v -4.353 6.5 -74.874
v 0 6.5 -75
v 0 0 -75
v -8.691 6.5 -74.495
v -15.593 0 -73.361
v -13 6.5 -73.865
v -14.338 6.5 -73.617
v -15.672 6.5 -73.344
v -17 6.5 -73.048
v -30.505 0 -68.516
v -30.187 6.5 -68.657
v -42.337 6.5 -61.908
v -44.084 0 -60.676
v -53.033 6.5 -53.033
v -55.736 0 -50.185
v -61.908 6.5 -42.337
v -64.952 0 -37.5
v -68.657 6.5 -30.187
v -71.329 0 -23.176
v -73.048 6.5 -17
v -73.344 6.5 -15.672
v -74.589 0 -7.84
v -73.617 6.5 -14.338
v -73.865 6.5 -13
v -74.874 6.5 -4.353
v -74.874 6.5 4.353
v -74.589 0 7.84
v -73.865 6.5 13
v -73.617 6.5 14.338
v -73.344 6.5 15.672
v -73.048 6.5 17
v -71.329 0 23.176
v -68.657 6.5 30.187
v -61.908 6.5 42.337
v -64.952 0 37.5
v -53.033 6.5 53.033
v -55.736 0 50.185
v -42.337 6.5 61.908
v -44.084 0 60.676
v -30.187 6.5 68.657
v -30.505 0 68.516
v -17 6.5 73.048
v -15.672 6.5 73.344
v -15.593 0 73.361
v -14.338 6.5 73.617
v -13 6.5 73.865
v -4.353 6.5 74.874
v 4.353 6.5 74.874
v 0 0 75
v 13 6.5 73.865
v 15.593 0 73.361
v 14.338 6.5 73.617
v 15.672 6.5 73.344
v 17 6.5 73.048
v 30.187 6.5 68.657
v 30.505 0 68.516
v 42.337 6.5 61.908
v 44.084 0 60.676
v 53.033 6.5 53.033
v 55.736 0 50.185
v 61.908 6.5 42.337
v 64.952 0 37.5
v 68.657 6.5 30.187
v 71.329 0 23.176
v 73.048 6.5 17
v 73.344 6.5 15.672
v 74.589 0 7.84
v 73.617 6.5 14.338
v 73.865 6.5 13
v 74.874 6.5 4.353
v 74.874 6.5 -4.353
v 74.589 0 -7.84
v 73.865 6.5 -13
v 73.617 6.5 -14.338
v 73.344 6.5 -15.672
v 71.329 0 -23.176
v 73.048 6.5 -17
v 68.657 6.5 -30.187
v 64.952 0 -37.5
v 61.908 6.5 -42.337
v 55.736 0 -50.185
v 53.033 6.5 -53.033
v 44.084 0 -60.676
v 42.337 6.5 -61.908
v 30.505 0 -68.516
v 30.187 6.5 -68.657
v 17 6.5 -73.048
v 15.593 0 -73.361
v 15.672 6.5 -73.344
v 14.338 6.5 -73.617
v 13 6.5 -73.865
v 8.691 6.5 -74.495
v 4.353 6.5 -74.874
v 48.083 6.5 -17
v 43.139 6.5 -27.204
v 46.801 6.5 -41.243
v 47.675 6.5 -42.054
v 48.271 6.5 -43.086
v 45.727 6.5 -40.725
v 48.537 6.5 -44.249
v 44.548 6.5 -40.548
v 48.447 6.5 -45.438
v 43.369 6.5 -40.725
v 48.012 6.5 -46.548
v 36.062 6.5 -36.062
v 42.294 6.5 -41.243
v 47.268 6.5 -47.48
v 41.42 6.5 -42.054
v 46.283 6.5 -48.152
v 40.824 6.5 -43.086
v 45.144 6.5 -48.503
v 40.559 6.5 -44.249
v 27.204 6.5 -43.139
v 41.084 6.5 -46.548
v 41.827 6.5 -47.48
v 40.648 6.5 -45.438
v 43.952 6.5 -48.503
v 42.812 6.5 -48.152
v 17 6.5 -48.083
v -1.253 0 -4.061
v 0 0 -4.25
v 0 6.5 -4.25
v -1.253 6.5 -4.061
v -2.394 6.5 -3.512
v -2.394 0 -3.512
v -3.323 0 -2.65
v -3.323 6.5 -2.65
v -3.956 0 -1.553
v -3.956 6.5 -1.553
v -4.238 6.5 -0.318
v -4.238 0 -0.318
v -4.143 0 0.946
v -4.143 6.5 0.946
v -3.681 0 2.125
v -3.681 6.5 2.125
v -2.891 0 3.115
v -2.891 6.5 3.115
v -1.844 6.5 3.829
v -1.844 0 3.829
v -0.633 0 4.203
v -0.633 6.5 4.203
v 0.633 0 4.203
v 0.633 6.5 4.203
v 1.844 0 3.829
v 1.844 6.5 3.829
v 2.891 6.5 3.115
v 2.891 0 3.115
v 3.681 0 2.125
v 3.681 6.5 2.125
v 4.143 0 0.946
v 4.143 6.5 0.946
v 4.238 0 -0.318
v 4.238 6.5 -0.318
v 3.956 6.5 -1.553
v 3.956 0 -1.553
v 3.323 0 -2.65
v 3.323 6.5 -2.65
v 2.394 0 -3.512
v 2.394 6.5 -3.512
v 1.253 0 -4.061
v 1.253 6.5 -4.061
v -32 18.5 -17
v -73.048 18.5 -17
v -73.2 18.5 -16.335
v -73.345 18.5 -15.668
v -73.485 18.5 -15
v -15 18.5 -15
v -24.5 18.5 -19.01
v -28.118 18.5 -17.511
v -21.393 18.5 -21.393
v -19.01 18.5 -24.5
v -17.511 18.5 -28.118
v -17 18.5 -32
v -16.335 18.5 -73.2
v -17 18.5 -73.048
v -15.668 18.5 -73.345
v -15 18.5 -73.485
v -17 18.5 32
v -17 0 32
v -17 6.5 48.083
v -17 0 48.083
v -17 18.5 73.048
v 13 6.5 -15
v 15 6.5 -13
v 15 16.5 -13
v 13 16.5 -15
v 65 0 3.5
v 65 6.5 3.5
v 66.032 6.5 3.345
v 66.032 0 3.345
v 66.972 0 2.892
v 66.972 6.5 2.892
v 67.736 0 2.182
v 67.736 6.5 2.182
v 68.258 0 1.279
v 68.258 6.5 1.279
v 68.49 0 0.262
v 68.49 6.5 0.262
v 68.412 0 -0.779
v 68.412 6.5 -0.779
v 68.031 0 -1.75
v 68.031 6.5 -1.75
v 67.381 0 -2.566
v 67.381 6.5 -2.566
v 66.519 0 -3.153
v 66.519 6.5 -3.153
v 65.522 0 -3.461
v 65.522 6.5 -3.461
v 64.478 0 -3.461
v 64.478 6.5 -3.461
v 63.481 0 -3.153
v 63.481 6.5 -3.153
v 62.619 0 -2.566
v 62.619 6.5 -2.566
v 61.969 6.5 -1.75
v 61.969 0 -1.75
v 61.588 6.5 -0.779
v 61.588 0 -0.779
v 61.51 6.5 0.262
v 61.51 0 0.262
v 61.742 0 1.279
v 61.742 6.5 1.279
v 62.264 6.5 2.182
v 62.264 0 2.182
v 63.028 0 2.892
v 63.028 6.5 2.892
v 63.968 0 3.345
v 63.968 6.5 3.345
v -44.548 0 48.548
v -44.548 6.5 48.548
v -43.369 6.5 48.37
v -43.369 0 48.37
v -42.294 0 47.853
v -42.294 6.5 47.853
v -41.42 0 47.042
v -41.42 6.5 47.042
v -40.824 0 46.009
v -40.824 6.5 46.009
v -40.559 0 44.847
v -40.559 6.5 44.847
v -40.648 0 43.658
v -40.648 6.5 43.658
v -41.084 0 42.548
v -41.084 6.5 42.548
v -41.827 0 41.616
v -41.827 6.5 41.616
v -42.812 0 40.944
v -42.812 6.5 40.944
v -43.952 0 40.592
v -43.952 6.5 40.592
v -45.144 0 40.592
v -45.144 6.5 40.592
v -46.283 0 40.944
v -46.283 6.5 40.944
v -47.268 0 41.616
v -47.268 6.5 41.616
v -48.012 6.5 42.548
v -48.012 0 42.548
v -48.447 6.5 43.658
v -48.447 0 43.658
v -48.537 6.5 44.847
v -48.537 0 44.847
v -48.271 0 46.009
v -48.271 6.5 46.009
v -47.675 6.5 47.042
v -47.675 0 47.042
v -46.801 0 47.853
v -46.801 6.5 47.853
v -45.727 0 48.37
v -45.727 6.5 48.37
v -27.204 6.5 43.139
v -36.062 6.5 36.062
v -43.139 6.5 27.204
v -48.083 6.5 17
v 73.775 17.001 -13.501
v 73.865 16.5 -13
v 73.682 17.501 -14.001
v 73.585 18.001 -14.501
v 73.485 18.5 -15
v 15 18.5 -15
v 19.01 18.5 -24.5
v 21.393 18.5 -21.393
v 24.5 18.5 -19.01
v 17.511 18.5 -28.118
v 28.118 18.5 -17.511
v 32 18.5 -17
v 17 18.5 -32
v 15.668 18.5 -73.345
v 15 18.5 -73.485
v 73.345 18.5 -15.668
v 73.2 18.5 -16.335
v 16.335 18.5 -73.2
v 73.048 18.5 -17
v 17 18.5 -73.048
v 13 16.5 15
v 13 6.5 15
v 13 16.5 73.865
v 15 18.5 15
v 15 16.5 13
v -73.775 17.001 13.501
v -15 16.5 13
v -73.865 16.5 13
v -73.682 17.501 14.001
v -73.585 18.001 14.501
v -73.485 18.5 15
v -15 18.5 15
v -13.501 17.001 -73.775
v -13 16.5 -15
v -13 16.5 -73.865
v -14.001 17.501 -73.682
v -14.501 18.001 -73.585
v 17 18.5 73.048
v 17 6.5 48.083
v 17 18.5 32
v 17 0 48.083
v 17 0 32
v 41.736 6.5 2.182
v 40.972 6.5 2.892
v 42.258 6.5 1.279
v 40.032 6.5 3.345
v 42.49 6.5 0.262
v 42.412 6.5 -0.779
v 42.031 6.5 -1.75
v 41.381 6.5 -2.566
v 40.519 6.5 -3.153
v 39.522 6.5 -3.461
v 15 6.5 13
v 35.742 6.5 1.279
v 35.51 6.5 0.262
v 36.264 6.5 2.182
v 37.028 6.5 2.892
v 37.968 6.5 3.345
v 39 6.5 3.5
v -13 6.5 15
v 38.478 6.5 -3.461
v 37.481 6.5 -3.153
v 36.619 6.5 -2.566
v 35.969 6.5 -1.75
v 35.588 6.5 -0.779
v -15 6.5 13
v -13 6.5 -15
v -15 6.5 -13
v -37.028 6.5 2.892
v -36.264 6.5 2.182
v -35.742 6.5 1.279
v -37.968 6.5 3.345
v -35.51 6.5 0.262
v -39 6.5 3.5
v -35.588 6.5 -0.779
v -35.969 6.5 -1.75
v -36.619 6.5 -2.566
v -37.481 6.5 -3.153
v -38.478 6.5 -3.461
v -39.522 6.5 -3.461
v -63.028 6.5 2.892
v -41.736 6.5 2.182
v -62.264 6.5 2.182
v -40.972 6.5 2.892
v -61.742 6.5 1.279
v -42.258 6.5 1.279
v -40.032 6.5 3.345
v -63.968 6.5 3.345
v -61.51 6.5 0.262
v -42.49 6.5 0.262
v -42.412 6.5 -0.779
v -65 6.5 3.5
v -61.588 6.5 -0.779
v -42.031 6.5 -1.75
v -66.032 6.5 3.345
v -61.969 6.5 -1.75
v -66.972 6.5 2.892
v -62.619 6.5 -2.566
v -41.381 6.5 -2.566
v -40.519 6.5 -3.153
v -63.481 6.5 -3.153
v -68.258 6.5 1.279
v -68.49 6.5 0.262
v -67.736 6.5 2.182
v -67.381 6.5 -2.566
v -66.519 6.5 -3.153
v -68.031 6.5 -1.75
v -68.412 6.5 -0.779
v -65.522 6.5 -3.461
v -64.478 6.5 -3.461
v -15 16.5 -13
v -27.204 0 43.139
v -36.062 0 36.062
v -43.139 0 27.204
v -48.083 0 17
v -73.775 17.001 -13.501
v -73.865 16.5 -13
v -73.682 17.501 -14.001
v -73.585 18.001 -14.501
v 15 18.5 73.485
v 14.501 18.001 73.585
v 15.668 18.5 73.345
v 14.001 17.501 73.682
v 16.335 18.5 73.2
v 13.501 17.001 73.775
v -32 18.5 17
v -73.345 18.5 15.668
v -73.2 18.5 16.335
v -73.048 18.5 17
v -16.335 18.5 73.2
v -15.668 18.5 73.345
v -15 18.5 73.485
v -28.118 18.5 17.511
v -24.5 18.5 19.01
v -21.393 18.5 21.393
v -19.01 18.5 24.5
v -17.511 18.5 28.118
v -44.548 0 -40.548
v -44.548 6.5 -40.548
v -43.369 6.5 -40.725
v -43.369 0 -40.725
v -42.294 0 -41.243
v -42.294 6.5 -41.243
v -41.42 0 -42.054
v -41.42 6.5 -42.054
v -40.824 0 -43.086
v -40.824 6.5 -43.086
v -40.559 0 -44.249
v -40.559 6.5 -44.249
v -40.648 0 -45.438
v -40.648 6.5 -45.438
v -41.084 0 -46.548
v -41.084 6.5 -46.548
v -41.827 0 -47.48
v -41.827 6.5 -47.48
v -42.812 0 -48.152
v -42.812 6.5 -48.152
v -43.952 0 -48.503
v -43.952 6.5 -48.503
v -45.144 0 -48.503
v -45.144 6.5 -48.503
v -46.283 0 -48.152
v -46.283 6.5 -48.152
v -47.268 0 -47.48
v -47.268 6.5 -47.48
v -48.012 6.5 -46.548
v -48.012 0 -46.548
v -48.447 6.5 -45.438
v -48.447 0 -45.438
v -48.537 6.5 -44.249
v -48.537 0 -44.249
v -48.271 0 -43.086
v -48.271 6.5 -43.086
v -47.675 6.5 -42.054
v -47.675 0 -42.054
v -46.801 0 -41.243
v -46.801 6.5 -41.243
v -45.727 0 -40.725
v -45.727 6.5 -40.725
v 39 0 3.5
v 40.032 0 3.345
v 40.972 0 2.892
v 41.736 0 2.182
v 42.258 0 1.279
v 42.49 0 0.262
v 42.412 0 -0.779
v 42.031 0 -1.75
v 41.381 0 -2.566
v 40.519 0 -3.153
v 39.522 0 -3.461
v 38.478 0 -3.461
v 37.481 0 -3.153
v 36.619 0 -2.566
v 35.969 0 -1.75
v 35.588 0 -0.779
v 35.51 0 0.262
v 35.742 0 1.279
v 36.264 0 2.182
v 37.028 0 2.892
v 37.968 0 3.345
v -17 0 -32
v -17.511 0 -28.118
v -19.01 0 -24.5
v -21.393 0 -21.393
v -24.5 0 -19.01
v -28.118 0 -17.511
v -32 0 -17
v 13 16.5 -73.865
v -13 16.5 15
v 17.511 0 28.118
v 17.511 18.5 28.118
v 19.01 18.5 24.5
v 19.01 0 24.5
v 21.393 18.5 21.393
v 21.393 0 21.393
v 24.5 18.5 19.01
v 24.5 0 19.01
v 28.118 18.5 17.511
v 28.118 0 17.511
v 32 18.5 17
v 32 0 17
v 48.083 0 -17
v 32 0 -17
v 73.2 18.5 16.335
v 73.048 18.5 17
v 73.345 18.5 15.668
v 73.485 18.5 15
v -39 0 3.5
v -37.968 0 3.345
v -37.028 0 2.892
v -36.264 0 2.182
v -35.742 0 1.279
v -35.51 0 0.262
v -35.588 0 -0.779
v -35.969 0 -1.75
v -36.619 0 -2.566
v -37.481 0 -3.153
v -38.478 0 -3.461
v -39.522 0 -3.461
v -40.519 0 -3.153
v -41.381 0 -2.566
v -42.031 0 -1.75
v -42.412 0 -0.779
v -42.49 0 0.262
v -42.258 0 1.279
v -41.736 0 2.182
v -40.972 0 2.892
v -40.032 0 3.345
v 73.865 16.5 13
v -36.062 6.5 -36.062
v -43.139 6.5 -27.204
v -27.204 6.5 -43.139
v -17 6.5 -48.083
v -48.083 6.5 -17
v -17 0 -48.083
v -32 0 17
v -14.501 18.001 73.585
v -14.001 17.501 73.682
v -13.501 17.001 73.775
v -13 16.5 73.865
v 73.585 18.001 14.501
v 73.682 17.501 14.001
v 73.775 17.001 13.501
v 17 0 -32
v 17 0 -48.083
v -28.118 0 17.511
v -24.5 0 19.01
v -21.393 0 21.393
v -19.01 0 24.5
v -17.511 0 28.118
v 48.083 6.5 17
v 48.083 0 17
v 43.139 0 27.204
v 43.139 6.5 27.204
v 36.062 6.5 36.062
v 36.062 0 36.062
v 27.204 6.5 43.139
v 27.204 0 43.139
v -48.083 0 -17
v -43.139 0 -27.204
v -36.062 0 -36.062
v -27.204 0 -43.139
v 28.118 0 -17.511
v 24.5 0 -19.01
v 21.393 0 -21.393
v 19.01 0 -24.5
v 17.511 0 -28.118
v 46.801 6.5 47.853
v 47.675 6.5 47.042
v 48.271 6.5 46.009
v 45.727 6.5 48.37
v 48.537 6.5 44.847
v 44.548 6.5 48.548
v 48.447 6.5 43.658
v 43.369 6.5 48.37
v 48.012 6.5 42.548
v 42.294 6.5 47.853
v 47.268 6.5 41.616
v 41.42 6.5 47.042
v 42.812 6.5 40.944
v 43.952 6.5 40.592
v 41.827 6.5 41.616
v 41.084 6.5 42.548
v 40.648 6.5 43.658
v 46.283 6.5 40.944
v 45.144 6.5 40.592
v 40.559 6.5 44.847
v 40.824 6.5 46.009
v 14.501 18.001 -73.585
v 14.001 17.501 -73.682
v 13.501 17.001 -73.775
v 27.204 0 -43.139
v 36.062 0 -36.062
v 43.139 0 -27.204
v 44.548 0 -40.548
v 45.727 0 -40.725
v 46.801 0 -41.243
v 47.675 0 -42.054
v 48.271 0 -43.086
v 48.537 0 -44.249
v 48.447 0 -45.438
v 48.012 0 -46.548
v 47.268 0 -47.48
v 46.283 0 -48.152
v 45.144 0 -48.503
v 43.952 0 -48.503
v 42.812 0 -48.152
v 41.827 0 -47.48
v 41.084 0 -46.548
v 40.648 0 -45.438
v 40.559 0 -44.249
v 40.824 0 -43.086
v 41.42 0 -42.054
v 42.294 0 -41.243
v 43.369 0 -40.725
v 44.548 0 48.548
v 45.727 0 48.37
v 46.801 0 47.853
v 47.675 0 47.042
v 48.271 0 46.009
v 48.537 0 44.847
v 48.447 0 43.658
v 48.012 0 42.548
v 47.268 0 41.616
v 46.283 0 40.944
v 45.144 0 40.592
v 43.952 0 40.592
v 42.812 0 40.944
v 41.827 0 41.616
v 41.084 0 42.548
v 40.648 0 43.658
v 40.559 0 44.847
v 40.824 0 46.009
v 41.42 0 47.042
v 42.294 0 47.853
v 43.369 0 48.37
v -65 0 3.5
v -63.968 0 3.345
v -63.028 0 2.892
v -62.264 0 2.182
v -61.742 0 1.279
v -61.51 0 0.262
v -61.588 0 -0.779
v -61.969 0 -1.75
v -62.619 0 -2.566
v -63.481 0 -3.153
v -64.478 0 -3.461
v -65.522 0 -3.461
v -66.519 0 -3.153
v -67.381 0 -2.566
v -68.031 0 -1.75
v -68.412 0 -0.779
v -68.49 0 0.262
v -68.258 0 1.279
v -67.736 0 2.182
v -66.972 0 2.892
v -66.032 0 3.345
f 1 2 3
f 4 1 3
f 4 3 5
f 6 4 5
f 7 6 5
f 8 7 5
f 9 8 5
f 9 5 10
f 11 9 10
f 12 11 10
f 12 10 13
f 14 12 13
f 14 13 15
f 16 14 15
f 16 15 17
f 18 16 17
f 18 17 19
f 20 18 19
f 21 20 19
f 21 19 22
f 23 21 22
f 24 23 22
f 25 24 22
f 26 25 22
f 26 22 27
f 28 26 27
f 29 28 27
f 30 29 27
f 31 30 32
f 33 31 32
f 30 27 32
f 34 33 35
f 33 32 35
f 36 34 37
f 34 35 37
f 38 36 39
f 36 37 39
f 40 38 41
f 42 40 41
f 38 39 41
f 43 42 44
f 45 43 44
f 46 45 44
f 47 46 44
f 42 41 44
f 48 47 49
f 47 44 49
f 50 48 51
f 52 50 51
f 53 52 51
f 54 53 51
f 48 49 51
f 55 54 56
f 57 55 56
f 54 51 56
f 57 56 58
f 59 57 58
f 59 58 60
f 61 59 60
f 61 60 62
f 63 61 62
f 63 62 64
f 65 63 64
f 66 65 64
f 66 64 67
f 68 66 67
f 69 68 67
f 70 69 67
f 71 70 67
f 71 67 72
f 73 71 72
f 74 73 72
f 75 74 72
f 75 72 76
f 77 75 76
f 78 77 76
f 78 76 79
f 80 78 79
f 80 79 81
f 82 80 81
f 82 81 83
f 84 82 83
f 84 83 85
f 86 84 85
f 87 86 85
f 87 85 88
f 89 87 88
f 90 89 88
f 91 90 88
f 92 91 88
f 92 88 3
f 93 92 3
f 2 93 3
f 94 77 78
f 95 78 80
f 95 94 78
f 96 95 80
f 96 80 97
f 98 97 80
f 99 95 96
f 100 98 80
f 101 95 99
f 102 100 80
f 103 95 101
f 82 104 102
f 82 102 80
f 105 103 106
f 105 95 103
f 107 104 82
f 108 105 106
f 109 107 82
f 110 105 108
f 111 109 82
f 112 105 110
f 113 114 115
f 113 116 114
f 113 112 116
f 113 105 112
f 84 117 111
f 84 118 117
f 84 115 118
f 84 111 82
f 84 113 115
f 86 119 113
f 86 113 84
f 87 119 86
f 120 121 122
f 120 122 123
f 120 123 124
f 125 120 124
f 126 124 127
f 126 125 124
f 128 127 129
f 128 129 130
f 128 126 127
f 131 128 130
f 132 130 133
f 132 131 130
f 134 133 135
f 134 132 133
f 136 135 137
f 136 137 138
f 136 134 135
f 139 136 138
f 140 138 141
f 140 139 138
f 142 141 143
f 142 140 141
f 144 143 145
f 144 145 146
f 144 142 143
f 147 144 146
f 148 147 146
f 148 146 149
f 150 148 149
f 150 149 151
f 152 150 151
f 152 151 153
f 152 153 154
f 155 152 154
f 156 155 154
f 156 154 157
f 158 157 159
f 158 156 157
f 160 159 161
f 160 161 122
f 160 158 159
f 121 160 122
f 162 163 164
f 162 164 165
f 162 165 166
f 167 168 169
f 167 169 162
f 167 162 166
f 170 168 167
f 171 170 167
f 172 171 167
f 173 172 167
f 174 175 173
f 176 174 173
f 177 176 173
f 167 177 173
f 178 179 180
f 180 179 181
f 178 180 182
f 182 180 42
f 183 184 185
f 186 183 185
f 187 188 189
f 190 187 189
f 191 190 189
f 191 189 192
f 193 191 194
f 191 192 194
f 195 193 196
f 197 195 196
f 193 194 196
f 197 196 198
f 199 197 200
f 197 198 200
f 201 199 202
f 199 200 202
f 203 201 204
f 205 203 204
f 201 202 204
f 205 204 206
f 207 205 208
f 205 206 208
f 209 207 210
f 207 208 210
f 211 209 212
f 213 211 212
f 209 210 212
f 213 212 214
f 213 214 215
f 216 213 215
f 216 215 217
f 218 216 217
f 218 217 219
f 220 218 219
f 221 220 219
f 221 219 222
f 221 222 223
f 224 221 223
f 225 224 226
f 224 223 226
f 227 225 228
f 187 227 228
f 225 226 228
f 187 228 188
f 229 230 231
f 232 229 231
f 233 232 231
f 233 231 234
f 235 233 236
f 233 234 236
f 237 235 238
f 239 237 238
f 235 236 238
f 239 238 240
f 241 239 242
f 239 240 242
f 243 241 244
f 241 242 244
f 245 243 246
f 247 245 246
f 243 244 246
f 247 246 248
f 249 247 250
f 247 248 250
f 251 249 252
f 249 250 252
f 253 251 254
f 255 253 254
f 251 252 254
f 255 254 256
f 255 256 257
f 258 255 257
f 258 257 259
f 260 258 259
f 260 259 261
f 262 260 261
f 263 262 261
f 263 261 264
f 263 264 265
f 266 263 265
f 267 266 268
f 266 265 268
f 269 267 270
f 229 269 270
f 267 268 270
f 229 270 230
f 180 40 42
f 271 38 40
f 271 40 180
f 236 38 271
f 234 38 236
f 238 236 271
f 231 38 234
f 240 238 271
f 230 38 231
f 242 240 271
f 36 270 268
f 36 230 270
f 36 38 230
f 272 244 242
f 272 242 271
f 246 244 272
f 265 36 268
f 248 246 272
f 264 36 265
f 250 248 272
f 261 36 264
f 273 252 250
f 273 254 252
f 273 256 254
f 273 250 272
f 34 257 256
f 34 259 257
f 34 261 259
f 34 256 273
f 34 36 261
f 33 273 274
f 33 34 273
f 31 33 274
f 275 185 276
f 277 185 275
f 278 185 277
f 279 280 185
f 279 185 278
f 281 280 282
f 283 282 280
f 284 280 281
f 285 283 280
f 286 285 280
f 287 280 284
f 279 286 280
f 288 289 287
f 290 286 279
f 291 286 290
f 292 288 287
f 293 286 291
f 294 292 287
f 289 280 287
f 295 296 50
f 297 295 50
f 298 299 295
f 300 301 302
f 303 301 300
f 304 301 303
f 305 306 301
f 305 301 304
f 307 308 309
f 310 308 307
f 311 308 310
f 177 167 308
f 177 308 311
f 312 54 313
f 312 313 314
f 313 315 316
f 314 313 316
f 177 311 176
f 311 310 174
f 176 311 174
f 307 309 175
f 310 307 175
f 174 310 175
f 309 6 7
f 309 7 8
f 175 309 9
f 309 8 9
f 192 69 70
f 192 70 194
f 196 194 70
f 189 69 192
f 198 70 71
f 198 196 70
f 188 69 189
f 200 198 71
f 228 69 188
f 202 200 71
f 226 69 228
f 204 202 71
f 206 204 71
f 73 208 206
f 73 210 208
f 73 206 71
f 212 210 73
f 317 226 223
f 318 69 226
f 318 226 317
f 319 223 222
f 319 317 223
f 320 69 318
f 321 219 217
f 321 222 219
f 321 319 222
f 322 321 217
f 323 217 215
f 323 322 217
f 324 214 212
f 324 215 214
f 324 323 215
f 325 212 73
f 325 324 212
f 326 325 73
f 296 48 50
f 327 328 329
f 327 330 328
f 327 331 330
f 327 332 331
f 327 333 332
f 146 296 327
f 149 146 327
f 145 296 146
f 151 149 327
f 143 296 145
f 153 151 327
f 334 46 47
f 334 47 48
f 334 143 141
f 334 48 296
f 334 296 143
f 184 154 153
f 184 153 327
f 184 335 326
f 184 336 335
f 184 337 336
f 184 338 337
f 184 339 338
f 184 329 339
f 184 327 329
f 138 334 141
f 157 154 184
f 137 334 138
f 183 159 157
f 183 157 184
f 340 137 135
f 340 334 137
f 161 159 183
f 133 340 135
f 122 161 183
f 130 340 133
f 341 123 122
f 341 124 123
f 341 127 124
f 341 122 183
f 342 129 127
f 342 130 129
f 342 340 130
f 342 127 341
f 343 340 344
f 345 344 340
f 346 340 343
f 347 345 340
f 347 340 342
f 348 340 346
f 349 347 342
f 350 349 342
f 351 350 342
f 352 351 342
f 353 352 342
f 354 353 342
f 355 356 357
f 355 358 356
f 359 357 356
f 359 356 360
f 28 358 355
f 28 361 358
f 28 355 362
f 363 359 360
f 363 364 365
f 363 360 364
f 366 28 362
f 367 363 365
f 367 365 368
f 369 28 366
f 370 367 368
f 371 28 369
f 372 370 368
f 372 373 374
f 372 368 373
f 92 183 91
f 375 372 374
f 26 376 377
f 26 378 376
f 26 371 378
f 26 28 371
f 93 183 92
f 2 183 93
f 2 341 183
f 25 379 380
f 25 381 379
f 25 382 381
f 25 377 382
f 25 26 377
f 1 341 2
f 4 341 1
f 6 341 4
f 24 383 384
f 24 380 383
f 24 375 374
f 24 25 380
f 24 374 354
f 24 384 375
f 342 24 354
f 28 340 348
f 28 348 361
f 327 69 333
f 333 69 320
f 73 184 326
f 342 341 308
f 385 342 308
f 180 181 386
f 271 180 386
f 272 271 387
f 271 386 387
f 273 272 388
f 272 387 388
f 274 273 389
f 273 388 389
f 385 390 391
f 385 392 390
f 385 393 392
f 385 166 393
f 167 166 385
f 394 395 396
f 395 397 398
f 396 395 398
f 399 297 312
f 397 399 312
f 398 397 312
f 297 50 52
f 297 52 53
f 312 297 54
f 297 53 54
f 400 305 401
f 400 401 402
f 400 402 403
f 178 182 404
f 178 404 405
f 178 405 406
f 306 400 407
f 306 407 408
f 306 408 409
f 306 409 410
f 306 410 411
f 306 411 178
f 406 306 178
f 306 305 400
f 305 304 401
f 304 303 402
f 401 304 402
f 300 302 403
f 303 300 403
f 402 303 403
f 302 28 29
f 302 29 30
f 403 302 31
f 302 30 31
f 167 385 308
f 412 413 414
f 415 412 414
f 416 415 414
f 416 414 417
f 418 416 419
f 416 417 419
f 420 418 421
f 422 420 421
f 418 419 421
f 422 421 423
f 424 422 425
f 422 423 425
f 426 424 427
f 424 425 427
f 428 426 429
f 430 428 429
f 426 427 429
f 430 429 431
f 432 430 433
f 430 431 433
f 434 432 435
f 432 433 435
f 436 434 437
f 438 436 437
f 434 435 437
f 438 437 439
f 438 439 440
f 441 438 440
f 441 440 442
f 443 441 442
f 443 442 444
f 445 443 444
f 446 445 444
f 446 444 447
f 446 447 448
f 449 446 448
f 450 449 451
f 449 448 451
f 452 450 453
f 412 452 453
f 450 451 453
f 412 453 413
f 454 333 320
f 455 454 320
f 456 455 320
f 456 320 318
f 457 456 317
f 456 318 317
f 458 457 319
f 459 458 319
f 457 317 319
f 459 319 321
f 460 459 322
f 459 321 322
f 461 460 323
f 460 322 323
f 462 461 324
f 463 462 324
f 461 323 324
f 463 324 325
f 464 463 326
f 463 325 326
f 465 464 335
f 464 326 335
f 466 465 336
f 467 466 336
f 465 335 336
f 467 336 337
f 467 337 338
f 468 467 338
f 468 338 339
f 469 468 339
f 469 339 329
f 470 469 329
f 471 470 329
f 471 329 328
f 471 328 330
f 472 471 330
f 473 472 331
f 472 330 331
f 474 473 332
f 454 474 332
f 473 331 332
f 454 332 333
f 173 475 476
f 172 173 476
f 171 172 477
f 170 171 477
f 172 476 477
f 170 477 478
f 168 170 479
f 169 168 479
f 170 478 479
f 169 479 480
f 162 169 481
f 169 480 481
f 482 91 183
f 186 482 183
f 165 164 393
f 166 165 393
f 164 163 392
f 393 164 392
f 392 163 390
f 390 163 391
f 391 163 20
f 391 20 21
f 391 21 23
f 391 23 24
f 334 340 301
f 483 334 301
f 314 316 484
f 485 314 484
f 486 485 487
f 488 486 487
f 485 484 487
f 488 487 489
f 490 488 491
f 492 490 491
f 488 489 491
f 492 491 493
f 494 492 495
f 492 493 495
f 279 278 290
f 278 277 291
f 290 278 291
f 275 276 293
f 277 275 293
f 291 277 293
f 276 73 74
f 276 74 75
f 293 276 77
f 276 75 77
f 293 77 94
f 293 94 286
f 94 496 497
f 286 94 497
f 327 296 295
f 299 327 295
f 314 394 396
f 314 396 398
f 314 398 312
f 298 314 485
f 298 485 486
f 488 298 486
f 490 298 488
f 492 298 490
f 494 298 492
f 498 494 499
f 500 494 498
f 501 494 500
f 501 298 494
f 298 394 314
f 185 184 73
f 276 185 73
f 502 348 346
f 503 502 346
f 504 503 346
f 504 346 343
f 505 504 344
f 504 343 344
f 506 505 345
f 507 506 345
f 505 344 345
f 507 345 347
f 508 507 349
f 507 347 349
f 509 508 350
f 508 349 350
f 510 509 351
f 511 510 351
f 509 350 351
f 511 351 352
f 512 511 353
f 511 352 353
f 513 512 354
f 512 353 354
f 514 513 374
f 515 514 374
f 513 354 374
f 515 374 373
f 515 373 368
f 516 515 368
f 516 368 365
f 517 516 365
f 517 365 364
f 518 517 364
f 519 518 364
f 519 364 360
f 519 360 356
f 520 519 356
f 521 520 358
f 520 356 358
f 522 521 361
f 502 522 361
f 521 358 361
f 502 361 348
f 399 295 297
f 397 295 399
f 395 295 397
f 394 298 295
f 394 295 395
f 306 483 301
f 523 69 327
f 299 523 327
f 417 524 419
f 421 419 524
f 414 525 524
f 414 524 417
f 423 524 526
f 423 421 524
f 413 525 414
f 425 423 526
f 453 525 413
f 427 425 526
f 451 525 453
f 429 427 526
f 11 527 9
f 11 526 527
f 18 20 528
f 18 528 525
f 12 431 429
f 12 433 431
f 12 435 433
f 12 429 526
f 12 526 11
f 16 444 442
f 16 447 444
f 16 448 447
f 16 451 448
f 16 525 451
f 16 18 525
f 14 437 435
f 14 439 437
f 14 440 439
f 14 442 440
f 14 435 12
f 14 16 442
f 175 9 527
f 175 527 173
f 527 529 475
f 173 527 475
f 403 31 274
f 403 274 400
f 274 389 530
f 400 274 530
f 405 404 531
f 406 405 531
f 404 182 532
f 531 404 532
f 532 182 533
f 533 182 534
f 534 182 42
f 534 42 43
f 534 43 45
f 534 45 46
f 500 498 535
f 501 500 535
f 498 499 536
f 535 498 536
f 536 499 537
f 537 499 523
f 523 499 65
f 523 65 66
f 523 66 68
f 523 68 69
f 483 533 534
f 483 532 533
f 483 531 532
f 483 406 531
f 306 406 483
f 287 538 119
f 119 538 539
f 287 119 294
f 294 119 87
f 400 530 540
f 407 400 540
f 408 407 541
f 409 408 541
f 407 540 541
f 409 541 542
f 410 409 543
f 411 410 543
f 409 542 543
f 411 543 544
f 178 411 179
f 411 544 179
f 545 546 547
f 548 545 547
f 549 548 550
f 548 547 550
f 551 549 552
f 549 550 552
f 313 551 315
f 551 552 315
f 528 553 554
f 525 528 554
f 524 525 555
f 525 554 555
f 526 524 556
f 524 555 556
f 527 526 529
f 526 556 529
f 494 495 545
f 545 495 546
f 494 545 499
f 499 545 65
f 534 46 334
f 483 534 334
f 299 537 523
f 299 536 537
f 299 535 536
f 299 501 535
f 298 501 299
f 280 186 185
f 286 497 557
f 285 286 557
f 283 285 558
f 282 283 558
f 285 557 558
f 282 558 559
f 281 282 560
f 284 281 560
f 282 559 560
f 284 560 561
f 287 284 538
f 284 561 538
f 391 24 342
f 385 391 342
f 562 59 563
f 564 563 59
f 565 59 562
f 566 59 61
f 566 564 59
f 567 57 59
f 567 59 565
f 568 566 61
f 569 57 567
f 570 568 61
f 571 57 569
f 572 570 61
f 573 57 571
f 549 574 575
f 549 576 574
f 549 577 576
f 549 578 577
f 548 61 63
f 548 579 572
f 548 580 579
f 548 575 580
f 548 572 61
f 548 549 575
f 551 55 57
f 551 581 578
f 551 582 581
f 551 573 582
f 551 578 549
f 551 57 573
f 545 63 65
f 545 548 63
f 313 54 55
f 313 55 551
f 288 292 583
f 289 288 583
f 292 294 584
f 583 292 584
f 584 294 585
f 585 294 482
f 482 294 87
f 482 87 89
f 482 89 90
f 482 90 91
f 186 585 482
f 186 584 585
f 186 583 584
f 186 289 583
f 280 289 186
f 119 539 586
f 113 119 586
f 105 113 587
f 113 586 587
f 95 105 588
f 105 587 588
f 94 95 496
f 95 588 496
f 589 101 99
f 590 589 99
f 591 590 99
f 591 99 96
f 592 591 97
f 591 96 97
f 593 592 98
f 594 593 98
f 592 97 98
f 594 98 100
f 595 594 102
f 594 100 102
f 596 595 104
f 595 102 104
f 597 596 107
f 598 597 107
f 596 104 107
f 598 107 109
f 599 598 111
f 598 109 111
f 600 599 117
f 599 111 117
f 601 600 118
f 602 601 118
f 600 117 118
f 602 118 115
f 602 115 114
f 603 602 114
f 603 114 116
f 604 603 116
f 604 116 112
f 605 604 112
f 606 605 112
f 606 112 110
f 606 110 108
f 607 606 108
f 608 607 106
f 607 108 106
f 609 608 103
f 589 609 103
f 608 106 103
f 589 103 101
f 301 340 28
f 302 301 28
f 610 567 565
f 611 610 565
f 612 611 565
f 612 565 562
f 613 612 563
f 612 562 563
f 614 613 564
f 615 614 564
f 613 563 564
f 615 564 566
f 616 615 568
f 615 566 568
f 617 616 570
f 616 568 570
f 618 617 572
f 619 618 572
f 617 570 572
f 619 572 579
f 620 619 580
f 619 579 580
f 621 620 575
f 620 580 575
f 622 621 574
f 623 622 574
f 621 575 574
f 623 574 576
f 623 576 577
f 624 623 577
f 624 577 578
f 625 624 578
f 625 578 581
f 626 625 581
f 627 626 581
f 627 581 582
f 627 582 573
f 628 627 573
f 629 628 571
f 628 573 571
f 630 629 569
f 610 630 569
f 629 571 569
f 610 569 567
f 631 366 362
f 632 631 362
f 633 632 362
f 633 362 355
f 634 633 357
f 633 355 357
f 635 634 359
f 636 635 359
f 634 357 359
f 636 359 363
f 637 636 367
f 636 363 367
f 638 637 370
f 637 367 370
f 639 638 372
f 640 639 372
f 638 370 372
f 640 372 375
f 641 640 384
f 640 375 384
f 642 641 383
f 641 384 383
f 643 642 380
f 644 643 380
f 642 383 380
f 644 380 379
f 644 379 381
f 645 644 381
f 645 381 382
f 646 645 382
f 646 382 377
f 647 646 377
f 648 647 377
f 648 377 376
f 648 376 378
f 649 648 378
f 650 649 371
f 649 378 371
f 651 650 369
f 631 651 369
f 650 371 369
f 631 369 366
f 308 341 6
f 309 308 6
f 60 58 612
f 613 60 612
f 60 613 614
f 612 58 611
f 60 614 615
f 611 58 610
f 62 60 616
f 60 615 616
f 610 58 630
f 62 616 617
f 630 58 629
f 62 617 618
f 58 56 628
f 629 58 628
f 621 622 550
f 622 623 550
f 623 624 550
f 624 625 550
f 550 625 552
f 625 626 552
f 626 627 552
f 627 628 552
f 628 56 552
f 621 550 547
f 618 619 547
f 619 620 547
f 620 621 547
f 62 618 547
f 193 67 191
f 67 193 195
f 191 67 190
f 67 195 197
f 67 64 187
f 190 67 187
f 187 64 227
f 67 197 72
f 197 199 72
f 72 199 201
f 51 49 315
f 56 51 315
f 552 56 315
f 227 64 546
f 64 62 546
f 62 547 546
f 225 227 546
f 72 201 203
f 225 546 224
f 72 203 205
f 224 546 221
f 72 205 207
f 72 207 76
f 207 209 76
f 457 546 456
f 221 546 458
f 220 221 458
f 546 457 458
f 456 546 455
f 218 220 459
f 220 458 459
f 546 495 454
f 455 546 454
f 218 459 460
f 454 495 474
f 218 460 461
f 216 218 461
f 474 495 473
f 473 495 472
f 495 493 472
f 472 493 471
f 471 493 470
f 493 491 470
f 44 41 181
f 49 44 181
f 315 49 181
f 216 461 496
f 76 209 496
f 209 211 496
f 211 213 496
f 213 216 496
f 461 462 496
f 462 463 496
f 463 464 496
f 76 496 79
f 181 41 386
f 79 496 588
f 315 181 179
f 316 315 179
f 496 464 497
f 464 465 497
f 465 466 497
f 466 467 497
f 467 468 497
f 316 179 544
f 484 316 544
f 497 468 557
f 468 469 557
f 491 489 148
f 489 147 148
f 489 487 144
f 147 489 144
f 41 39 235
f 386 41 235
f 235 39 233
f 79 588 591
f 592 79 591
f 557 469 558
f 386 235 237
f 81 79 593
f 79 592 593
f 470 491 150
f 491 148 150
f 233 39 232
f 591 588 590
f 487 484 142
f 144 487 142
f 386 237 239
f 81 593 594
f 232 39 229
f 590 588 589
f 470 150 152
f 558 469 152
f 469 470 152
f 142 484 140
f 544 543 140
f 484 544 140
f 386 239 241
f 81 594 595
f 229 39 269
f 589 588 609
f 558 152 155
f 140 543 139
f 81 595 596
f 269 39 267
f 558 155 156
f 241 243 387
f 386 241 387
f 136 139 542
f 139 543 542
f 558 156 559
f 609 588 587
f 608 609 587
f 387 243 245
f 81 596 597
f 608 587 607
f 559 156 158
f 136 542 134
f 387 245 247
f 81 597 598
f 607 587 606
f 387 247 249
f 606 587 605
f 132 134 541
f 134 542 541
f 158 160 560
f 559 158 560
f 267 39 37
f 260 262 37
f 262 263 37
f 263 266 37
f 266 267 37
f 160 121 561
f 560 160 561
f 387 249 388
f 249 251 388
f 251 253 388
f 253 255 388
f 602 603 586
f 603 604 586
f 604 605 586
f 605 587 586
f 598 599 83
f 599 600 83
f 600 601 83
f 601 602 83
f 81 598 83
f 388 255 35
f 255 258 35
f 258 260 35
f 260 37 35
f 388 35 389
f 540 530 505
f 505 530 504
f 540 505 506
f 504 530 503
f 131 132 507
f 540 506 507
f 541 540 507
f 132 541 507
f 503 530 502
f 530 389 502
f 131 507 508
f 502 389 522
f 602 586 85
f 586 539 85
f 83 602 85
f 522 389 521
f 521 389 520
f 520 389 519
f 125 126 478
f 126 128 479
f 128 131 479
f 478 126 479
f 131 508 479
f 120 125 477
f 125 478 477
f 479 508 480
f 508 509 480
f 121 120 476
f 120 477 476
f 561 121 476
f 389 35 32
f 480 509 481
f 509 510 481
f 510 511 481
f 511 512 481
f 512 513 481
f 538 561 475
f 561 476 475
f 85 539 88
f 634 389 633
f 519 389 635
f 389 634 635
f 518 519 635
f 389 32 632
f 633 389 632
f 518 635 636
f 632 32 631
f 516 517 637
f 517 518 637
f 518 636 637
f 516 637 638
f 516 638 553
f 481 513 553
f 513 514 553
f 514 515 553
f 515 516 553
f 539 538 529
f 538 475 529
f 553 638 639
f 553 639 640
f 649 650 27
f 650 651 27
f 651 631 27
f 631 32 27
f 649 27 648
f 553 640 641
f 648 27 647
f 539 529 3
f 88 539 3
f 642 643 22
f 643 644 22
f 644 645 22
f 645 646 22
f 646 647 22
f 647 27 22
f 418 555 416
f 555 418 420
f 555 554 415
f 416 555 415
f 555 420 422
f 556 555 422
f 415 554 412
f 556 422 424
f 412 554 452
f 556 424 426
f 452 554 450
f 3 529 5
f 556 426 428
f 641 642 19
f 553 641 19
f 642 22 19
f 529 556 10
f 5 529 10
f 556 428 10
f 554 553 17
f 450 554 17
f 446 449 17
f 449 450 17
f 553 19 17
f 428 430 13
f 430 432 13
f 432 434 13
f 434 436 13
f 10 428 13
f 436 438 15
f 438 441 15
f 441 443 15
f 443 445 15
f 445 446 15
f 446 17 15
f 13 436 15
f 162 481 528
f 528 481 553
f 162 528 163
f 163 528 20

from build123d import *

# Parameters (mm, degrees)
SKETCH1_R           = 75
SKETCH1_R_2         = 4.25
BOSS_EXTRUDE1_DEPTH = 6.5
BOSS_EXTRUDE2_DEPTH = 12
CHAMFER1_SIZE       = 2
CUT_EXTRUDE1_START  = -6.5
CUT_EXTRUDE1_DEPTH  = 6.5
SKETCH5_R           = 3.5
CUT_EXTRUDE3_DEPTH  = 6.5
SKETCH4_R           = 4
CUT_EXTRUDE5_DEPTH  = 6.5


with BuildPart() as part:
    # Sketch1 → Boss-Extrude1 (new body)
    with BuildSketch(Plane(origin=(0, 0, 0), x_dir=(1, 0, 0), z_dir=(0, 1, 0))):
        with Locations(Location((0, 0, 0), (0, 0, 90))):
            Circle(SKETCH1_R)
        with Locations(Location((0, 0, 0), (0, 0, 90))):
            Circle(SKETCH1_R_2, mode=Mode.SUBTRACT)
    extrude(amount=BOSS_EXTRUDE1_DEPTH)

    # Sketch2 → Boss-Extrude2 (add)
    with BuildSketch(Plane(origin=(0, 6.5, 0), x_dir=(1, 0, 0), z_dir=(0, 1, 0))):
        with BuildLine():
            Line((-13, -13), (-73.86474125, -13))
            ThreePointArc((-73.86474125, -13), (-73.483557376, -15.005558816), (-73.047929471, -17))
            Line((-73.047929471, -17), (-32, -17))
            ThreePointArc((-32, -17), (-21.393398282, -21.393398282), (-17, -32))
            Line((-17, -32), (-17, -73.047929471))
            ThreePointArc((-17, -73.047929471), (-15.005558816, -73.483557376), (-13, -73.86474125))
            Line((-13, -73.86474125), (-13, -13))
        make_face()
        with BuildLine():
            Line((-32, 17), (-73.047929471, 17))
            ThreePointArc((-73.047929471, 17), (-73.483557376, 15.005558816), (-73.86474125, 13))
            Line((-73.86474125, 13), (-13, 13))
            Line((-13, 13), (-13, 73.86474125))
            ThreePointArc((-13, 73.86474125), (-15.005558816, 73.483557376), (-17, 73.047929471))
            Line((-17, 73.047929471), (-17, 32))
            ThreePointArc((-17, 32), (-21.393398282, 21.393398282), (-32, 17))
        make_face()
        with BuildLine():
            Line((17, 32), (17, 73.047929471))
            ThreePointArc((17, 73.047929471), (15.005558816, 73.483557376), (13, 73.86474125))
            Line((13, 73.86474125), (13, 13))
            Line((13, 13), (73.86474125, 13))
            ThreePointArc((73.86474125, 13), (73.483557376, 15.005558816), (73.047929471, 17))
            Line((73.047929471, 17), (32, 17))
            ThreePointArc((32, 17), (21.393398282, 21.393398282), (17, 32))
        make_face()
        with BuildLine():
            Line((32, -17), (73.047929471, -17))
            ThreePointArc((73.047929471, -17), (73.483557376, -15.005558816), (73.86474125, -13))
            Line((73.86474125, -13), (13, -13))
            Line((13, -13), (13, -73.86474125))
            ThreePointArc((13, -73.86474125), (15.005558816, -73.483557376), (17, -73.047929471))
            Line((17, -73.047929471), (17, -32))
            ThreePointArc((17, -32), (21.393398282, -21.393398282), (32, -17))
        make_face()
    extrude(amount=BOSS_EXTRUDE2_DEPTH)

    # Chamfer1
    chamfer1_edges = [part.edges().sort_by_distance(p)[0] for p in [
        (-13, 12.5, 13),
        (-13, 18.5, 43.432370625),
        (-43.432370625, 18.5, 13),
        (13, 12.5, 13),
        (43.432370625, 18.5, 13),
        (13, 18.5, 43.432370625),
        (-13, 12.5, -13),
        (-43.432370625, 18.5, -13),
        (-13, 18.5, -43.432370625),
        (13, 12.5, -13),
        (13, 18.5, -43.432370625),
        (43.432370625, 18.5, -13),
    ]]
    chamfer(chamfer1_edges, length=CHAMFER1_SIZE)

    # Sketch3 → Cut-Extrude1 (cut)
    with BuildSketch(Plane(origin=(0, 6.5, 0), x_dir=(1, 0, 0), z_dir=(0, 1, 0)).offset(CUT_EXTRUDE1_START)):
        with BuildLine():
            Line((32, -17), (48.083261121, -17))
            ThreePointArc((48.083261121, -17), (36.062445841, -36.062445841), (17, -48.083261121))
            Line((17, -48.083261121), (17, -32))
            ThreePointArc((17, -32), (21.393398282, -21.393398282), (32, -17))
        make_face()
        with BuildLine():
            Line((-17, -32), (-17, -48.083261121))
            ThreePointArc((-17, -48.083261121), (-36.062445841, -36.062445841), (-48.083261121, -17))
            Line((-48.083261121, -17), (-32, -17))
            ThreePointArc((-32, -17), (-21.393398282, -21.393398282), (-17, -32))
        make_face()
        with BuildLine():
            Line((17, 32), (17, 48.083261121))
            ThreePointArc((17, 48.083261121), (36.062445841, 36.062445841), (48.083261121, 17))
            Line((48.083261121, 17), (32, 17))
            ThreePointArc((32, 17), (21.393398282, 21.393398282), (17, 32))
        make_face()
        with BuildLine():
            Line((-32, 17), (-48.083261121, 17))
            ThreePointArc((-48.083261121, 17), (-36.062445841, 36.062445841), (-17, 48.083261121))
            Line((-17, 48.083261121), (-17, 32))
            ThreePointArc((-17, 32), (-21.393398282, 21.393398282), (-32, 17))
        make_face()
    extrude(amount=CUT_EXTRUDE1_DEPTH, mode=Mode.SUBTRACT)

    # Sketch5 → Cut-Extrude3 (cut)
    with BuildSketch(Plane(origin=(0, 6.5, 0), x_dir=(1, 0, 0), z_dir=(0, 1, 0))):
        with Locations(Location((65, 0, 0), (0, 0, 270))):
            Circle(SKETCH5_R)
        with Locations(Location((39, 0, 0), (0, 0, 270))):
            Circle(SKETCH5_R)
        with Locations(Location((-39, 0, 0), (0, 0, 270))):
            Circle(SKETCH5_R)
        with Locations(Location((-65, 0, 0), (0, 0, 270))):
            Circle(SKETCH5_R)
    extrude(amount=-CUT_EXTRUDE3_DEPTH, mode=Mode.SUBTRACT)

    # Sketch4 → Cut-Extrude5 (cut)
    with BuildSketch(Plane(origin=(0, 6.5, 0), x_dir=(1, 0, 0), z_dir=(0, 1, 0))):
        with Locations(Location((44.547727215, -44.547727215, 0), (0, 0, 270))):
            Circle(SKETCH4_R)
        with Locations(Location((-44.547727215, -44.547727215, 0), (0, 0, 270))):
            Circle(SKETCH4_R)
        with Locations(Location((44.547727215, 44.547727215, 0), (0, 0, 270))):
            Circle(SKETCH4_R)
        with Locations(Location((-44.547727215, 44.547727215, 0), (0, 0, 270))):
            Circle(SKETCH4_R)
    extrude(amount=-CUT_EXTRUDE5_DEPTH, mode=Mode.SUBTRACT)


solid = part.part
